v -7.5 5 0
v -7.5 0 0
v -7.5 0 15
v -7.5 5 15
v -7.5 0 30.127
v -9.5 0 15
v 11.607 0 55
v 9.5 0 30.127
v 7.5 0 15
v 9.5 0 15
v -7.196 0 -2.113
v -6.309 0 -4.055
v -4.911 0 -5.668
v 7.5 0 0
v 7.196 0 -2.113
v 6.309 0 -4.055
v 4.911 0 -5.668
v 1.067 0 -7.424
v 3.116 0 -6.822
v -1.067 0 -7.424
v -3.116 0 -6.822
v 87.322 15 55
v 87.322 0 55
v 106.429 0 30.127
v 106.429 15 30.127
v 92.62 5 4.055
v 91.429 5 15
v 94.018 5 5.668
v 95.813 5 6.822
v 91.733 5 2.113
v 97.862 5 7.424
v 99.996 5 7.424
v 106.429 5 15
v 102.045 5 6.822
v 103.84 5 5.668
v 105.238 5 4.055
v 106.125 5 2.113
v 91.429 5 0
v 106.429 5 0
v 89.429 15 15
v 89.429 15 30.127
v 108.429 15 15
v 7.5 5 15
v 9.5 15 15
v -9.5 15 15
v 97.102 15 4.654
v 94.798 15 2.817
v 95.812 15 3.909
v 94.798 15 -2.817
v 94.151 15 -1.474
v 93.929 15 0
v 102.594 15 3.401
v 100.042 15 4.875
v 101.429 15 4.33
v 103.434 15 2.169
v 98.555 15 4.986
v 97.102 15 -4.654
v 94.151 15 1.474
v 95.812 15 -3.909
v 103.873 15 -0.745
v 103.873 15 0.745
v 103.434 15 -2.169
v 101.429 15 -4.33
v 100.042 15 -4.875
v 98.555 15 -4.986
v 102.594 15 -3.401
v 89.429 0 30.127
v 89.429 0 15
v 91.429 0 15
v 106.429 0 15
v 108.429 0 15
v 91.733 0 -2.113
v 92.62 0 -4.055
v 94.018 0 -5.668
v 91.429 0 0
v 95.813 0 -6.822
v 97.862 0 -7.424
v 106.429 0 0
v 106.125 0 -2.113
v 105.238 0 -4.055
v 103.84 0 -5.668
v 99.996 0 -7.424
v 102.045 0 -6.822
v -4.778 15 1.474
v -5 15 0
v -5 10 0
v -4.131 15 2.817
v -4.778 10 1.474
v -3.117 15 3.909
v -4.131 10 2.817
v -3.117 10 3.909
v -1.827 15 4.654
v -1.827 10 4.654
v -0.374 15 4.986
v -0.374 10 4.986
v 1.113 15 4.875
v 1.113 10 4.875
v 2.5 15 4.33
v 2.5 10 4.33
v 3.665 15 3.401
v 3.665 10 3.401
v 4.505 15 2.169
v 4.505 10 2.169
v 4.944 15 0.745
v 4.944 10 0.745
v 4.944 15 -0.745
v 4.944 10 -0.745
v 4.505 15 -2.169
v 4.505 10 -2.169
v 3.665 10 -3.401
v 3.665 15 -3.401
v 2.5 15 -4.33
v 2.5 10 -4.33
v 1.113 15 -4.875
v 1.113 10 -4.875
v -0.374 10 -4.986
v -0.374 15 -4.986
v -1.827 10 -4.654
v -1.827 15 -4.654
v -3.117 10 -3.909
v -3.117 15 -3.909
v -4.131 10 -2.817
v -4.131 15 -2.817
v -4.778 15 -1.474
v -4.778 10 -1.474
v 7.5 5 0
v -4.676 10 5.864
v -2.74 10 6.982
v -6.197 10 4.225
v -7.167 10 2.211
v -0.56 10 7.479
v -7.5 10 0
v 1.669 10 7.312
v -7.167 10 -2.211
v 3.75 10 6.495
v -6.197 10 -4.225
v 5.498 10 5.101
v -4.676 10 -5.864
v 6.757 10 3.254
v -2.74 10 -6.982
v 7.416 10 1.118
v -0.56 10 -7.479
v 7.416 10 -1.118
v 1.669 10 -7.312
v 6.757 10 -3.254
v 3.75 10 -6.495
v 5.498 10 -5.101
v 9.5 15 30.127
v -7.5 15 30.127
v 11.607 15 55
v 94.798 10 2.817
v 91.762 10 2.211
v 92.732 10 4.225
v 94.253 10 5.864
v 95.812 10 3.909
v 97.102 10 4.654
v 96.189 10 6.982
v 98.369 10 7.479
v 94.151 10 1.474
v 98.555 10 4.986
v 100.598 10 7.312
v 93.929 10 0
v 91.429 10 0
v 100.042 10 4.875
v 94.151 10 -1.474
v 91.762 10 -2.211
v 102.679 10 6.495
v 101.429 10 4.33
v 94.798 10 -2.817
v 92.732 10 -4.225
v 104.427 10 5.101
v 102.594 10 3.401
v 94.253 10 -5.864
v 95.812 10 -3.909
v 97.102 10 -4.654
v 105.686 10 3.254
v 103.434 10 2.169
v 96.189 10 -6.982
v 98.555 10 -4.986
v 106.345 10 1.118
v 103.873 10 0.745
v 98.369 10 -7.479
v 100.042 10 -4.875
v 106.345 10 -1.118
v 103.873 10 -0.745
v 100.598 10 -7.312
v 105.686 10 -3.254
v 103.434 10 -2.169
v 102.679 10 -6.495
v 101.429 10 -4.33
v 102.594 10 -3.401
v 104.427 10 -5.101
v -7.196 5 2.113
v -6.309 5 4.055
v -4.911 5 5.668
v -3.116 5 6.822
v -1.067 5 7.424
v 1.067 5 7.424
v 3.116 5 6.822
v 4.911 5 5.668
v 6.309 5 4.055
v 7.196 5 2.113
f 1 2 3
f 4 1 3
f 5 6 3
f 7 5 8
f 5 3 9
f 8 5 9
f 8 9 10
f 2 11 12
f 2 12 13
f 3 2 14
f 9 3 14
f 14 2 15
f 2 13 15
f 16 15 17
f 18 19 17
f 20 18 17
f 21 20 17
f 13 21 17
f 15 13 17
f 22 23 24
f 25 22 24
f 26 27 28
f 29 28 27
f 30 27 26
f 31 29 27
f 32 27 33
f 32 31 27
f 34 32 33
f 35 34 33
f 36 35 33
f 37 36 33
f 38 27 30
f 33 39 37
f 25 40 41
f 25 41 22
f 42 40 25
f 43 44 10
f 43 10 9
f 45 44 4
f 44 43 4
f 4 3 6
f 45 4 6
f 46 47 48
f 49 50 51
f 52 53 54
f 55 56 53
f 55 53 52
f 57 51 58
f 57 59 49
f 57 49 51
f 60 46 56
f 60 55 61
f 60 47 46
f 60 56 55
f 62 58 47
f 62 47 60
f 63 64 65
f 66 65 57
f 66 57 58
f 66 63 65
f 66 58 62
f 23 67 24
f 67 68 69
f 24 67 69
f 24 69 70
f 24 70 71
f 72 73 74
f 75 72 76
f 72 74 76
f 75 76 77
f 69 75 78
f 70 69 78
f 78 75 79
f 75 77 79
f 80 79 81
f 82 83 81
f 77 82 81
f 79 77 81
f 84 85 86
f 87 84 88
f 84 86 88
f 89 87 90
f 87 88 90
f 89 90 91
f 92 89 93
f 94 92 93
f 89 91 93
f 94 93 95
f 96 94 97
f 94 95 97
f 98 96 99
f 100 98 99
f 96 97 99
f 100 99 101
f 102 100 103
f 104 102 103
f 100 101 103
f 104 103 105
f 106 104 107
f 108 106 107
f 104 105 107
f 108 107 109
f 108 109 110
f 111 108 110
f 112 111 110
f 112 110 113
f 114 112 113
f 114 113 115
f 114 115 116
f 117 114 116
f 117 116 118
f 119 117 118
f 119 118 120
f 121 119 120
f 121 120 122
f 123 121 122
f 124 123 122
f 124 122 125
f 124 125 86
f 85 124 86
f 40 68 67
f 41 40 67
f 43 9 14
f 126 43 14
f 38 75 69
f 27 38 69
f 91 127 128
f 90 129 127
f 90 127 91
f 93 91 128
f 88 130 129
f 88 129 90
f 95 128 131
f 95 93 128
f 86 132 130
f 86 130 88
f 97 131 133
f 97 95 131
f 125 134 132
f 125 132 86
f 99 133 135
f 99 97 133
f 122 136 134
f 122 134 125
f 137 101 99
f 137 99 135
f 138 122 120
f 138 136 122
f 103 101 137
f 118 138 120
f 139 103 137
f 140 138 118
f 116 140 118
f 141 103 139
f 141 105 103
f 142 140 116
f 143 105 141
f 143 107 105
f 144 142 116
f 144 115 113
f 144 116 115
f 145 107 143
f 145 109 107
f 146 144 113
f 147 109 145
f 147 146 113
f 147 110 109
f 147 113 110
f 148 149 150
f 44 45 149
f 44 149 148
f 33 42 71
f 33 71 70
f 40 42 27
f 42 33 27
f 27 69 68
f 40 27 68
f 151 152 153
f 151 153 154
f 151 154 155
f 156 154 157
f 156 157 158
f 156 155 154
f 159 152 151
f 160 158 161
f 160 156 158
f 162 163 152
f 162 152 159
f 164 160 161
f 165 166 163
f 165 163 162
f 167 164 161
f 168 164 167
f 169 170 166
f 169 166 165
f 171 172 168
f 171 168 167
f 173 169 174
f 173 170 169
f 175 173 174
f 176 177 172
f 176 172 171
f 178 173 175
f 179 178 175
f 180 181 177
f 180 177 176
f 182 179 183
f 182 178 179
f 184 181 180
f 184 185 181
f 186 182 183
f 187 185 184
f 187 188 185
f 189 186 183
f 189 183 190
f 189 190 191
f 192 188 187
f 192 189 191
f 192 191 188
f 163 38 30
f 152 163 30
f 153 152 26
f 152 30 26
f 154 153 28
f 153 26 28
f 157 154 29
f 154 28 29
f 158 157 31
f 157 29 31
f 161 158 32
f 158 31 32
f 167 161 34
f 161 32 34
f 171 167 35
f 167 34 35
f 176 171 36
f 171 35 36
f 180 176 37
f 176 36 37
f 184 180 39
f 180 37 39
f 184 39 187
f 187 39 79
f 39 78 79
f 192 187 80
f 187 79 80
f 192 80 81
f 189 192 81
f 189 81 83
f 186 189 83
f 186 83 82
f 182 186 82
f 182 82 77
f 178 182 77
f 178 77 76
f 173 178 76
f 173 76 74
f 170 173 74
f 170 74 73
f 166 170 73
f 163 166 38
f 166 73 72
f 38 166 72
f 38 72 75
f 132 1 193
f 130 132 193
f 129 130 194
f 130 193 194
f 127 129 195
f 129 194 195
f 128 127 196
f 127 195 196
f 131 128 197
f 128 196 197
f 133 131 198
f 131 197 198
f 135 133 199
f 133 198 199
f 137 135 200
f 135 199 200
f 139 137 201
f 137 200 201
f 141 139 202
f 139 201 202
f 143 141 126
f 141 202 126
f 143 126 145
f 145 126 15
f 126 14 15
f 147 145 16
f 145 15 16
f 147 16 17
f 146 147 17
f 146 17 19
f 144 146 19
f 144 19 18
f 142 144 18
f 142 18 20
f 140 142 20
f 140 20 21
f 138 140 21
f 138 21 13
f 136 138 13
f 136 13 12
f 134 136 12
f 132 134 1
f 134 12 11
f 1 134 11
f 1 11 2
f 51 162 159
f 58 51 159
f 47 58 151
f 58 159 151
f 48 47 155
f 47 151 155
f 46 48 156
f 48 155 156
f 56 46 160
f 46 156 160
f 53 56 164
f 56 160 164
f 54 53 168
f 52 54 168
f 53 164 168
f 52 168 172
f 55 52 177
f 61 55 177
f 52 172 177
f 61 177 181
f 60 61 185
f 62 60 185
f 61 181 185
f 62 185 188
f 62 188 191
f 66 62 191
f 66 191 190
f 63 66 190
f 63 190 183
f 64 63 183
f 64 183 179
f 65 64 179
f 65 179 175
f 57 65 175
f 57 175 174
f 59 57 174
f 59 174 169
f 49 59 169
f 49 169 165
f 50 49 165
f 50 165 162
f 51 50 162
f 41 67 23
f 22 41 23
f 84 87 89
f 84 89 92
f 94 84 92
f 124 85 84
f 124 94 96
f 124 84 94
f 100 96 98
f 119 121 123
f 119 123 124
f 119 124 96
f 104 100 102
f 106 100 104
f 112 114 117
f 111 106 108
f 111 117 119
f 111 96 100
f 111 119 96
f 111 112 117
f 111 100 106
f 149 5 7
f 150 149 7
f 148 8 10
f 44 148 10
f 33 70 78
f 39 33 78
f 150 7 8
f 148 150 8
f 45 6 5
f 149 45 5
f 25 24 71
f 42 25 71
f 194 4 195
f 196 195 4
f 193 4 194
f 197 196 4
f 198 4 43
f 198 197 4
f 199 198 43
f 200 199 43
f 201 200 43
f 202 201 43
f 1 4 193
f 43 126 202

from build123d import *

# Parameters (mm, degrees)
SKETCH1_R           = 7.5
SKETCH1_R_2         = 5
BOSS_EXTRUDE1_DEPTH = 10
BOSS_EXTRUDE2_DEPTH = 15
BOSS_EXTRUDE3_DEPTH = 5
SKETCH1_5_R         = 5
BOSS_EXTRUDE4_DEPTH = 15
SKETCH1_6_R         = 5
BOSS_EXTRUDE5_DEPTH = 15
SKETCH1_7_R         = 7.5
SKETCH1_7_R_2       = 5
BOSS_EXTRUDE6_DEPTH = 10
BOSS_EXTRUDE7_DEPTH = 5
BOSS_EXTRUDE8_DEPTH = 15


with BuildPart() as part:
    # Sketch1 → Boss-Extrude1 (new body)
    with BuildSketch(Plane(origin=(0, 0, 0), x_dir=(1, 0, 0), z_dir=(0, 1, 0))):
        Circle(SKETCH1_R)
        Circle(SKETCH1_R_2, mode=Mode.SUBTRACT)
    extrude(amount=BOSS_EXTRUDE1_DEPTH)



with BuildPart() as body_2:
    # Sketch1<3> → Boss-Extrude2 (new body)
    with BuildSketch(Plane(origin=(0, 0, 0), x_dir=(1, 0, 0), z_dir=(0, 1, 0))):
        Polygon((-7.5, -15), (-9.5, -15), (-7.5, -30.12715853), (11.607364561, -55), (9.5, -30.12715853), (9.5, -15), (7.5, -15), align=None)
    extrude(amount=BOSS_EXTRUDE2_DEPTH)


with BuildPart() as part_1:
    add(part.part)

    add(body_2.part)  # Boss-Extrude3 merges body 2
    # Sketch1<4> → Boss-Extrude3 (add)
    with BuildSketch(Plane(origin=(0, 0, 0), x_dir=(1, 0, 0), z_dir=(0, 1, 0))):
        with BuildLine():
            Line((-7.5, 0), (-7.5, -15))
            Line((-7.5, -15), (7.5, -15))
            Line((7.5, -15), (7.5, 0))
            ThreePointArc((7.5, 0), (0, -7.5), (-7.5, 0))
        make_face()
    extrude(amount=BOSS_EXTRUDE3_DEPTH)

    # Sketch1<5> → Boss-Extrude4 (add)
    with BuildSketch(Plane(origin=(0, 0, 0), x_dir=(1, 0, 0), z_dir=(0, 1, 0))):
        Circle(SKETCH1_5_R)
    extrude(amount=BOSS_EXTRUDE4_DEPTH)


with BuildPart() as body_2_2:
    # Sketch1<6> → Boss-Extrude5 (new body)
    with BuildSketch(Plane(origin=(0, 0, 0), x_dir=(1, 0, 0), z_dir=(0, 1, 0))):
        with Locations((98.929018633, 0)):
            Circle(SKETCH1_6_R)
    extrude(amount=BOSS_EXTRUDE5_DEPTH)

    # Sketch1<7> → Boss-Extrude6 (add)
    with BuildSketch(Plane(origin=(0, 0, 0), x_dir=(1, 0, 0), z_dir=(0, 1, 0))):
        with Locations((98.929018633, 0)):
            Circle(SKETCH1_7_R)
        with Locations((98.929018633, 0)):
            Circle(SKETCH1_7_R_2, mode=Mode.SUBTRACT)
    extrude(amount=BOSS_EXTRUDE6_DEPTH)

    # Sketch1<8> → Boss-Extrude7 (add)
    with BuildSketch(Plane(origin=(0, 0, 0), x_dir=(1, 0, 0), z_dir=(0, 1, 0))):
        with BuildLine():
            ThreePointArc((106.429018633, 0), (98.929018633, -7.5), (91.429018633, 0))
            Line((91.429018633, 0), (91.429018633, -15))
            Line((91.429018633, -15), (106.429018633, -15))
            Line((106.429018633, -15), (106.429018633, 0))
        make_face()
    extrude(amount=BOSS_EXTRUDE7_DEPTH)

    # Sketch1<9> → Boss-Extrude8 (add)
    with BuildSketch(Plane(origin=(0, 0, 0), x_dir=(1, 0, 0), z_dir=(0, 1, 0))):
        Polygon((106.429018633, -15), (91.429018633, -15), (89.429018633, -15), (89.429018633, -30.12715853), (87.321654073, -55), (106.429018633, -30.12715853), (108.429018633, -15), align=None)
    extrude(amount=BOSS_EXTRUDE8_DEPTH)


solid = Compound([part_1.part, body_2_2.part])
